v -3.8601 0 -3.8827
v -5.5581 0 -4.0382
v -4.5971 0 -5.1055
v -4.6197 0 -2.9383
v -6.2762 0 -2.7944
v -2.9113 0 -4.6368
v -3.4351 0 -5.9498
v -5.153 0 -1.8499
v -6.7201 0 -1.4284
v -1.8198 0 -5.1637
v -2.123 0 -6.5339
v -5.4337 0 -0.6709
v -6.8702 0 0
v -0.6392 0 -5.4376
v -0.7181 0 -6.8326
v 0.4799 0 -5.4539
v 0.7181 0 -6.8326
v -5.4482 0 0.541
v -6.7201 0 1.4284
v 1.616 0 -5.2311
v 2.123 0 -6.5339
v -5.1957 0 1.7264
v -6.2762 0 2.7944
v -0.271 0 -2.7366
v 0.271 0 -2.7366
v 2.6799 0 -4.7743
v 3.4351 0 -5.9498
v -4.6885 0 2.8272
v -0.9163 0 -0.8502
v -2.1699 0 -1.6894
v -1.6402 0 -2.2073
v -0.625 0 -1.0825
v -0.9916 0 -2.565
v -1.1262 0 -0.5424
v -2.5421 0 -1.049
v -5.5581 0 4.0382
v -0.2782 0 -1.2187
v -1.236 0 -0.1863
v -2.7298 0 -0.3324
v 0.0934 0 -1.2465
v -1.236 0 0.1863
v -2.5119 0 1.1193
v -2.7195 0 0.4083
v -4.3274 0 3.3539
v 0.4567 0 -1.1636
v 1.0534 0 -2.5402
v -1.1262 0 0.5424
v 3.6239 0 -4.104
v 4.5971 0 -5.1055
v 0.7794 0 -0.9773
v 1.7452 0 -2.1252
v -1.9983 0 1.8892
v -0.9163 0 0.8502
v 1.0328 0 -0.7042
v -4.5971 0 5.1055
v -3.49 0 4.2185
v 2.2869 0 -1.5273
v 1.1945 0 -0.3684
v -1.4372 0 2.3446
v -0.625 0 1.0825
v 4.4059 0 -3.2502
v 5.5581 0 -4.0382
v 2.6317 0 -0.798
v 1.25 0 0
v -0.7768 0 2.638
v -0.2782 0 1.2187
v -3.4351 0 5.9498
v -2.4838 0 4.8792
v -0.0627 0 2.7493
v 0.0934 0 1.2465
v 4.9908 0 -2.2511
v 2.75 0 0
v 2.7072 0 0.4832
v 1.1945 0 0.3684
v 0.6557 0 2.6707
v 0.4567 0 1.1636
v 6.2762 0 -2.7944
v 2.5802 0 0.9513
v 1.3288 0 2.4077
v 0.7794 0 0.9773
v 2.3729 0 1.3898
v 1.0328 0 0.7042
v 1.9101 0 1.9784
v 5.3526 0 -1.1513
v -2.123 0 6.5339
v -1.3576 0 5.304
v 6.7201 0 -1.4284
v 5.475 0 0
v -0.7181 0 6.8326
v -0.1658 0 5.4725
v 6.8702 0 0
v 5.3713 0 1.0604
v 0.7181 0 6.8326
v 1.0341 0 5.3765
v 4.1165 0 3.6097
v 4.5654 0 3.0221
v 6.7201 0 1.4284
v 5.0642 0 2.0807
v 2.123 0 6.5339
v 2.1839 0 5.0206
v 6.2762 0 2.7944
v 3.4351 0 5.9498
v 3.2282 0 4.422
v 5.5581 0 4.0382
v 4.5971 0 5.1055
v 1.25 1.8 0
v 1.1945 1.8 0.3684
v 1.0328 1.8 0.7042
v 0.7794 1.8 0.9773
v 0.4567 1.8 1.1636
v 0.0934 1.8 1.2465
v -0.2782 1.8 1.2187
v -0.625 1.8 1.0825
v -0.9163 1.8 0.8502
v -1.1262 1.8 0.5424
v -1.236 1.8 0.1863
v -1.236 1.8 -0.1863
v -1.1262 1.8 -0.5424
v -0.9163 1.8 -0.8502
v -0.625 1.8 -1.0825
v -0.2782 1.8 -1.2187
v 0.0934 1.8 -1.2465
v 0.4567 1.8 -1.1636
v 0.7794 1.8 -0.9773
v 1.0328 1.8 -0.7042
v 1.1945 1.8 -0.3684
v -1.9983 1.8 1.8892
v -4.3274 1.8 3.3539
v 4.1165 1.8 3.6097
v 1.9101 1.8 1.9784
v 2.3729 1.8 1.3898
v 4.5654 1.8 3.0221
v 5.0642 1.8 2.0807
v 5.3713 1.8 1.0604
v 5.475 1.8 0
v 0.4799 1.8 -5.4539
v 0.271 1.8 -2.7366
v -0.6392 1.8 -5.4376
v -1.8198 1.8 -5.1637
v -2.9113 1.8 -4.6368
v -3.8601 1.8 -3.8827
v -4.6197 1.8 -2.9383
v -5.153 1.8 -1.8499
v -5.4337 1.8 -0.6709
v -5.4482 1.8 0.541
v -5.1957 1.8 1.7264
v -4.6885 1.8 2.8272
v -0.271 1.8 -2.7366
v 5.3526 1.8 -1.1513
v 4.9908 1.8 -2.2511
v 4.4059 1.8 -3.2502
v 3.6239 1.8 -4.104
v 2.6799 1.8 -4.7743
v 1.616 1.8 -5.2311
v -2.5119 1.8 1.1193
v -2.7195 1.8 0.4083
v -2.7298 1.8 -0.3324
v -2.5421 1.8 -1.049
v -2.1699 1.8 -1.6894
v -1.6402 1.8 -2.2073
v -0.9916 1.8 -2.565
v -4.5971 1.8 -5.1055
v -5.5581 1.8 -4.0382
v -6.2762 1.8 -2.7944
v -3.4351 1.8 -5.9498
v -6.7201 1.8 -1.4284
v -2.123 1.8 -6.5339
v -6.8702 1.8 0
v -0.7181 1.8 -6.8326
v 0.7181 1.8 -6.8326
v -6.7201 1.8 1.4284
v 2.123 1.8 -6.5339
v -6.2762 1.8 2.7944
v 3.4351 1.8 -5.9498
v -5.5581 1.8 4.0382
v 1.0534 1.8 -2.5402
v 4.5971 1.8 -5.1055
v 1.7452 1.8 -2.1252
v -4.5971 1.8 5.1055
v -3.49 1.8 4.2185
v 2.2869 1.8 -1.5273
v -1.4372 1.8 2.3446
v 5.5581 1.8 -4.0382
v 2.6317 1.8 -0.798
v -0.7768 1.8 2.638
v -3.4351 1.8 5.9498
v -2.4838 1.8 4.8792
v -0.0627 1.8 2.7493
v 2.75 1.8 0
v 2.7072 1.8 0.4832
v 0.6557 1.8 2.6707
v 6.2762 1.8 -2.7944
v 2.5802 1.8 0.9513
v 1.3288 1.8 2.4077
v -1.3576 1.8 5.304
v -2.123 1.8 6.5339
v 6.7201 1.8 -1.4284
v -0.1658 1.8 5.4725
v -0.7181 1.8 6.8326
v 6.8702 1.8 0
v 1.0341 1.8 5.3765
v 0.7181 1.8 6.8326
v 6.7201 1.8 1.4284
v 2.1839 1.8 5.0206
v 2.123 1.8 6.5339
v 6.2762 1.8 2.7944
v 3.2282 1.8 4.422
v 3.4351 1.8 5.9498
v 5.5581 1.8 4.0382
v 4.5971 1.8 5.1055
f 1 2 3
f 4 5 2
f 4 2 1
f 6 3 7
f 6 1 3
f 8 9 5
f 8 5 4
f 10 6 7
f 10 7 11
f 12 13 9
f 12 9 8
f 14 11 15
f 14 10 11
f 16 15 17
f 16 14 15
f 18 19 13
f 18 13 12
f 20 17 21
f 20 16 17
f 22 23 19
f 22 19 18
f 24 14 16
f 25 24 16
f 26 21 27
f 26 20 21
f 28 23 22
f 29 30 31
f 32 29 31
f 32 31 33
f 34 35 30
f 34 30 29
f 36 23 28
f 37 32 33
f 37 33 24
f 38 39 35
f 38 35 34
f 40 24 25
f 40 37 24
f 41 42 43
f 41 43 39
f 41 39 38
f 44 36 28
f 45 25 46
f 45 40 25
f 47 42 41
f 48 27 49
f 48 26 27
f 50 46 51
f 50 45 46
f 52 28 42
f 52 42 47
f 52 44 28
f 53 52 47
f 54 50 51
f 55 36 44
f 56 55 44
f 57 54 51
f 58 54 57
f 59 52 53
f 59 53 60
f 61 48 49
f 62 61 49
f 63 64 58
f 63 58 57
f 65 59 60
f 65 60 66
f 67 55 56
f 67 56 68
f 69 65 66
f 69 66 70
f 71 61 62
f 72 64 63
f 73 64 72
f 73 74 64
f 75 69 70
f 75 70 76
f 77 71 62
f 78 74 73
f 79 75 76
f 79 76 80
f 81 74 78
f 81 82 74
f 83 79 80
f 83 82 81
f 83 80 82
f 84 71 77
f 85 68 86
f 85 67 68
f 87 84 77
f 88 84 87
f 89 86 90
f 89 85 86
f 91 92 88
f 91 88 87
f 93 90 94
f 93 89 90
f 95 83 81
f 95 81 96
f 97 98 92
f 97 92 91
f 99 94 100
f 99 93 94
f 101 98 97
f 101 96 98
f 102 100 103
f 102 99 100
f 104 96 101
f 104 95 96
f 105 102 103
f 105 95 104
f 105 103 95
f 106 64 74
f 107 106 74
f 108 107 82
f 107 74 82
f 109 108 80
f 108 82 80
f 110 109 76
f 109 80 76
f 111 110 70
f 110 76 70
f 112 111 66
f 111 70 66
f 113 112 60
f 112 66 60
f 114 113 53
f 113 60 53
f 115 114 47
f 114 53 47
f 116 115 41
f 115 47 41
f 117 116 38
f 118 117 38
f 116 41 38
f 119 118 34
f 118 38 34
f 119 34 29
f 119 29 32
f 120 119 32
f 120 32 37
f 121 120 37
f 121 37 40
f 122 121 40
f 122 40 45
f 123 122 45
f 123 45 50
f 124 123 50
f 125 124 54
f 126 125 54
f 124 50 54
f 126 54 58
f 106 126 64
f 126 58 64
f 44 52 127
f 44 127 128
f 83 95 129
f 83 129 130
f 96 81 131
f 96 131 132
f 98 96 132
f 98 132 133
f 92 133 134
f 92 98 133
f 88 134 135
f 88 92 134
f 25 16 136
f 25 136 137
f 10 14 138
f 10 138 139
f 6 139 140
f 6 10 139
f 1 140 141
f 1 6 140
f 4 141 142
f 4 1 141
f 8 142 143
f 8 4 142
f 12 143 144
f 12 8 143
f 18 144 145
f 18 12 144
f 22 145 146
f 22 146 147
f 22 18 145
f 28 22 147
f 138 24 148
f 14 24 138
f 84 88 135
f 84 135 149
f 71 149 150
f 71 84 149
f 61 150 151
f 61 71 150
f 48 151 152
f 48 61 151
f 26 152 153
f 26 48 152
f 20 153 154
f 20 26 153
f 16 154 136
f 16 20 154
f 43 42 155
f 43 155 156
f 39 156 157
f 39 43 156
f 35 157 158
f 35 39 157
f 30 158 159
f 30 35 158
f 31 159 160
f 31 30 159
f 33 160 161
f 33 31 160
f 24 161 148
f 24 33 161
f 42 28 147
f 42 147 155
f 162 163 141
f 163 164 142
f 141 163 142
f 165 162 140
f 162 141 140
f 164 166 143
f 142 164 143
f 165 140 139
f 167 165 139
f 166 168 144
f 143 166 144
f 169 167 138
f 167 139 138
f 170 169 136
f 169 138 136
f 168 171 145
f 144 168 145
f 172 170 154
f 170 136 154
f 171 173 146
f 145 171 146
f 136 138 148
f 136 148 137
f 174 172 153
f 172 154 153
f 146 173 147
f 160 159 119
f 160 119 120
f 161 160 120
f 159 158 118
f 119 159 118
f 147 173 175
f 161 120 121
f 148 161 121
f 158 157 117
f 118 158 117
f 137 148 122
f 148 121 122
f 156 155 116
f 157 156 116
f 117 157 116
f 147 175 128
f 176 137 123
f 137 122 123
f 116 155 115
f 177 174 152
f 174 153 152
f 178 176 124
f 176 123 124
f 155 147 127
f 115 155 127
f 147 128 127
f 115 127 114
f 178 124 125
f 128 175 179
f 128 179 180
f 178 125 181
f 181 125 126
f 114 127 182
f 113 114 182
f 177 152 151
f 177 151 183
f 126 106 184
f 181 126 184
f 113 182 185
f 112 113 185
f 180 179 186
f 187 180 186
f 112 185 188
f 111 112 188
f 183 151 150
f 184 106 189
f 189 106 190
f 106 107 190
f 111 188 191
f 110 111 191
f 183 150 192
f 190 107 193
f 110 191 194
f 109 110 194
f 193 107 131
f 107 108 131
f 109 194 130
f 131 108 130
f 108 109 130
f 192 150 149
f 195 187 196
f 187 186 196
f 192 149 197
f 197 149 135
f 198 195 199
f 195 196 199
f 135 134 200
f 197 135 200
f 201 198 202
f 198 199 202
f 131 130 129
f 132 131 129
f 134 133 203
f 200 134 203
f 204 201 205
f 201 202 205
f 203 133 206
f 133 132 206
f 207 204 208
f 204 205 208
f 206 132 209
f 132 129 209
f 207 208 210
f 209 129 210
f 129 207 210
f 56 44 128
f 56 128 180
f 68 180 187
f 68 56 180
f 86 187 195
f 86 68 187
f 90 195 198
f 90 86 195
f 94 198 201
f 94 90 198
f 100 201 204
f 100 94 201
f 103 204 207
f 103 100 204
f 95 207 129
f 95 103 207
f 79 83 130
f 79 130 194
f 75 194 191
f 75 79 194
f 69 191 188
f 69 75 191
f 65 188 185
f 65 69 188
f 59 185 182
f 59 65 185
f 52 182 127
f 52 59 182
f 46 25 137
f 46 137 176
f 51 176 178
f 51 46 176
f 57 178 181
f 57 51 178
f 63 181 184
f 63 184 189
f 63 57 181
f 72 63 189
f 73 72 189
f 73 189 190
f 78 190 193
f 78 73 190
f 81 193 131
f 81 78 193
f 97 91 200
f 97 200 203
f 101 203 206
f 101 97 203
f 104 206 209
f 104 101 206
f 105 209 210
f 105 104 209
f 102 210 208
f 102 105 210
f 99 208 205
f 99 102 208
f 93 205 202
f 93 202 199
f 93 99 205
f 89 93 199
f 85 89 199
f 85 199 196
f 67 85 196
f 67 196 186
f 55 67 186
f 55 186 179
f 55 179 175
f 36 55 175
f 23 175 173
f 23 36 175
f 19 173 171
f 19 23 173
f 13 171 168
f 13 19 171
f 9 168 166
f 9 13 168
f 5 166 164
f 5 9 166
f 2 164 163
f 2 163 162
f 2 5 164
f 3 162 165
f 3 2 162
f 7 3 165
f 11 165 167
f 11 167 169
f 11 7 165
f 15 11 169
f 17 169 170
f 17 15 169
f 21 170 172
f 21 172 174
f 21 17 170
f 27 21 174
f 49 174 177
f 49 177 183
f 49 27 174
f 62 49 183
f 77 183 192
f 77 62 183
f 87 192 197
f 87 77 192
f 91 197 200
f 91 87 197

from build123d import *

# Parameters (mm, degrees)
F0_R     = 6.870187
F0_R_2   = 1.25
F1_DEPTH = 1.8


with BuildPart() as f1:
    # F0 (on Front) → F1 (new body)
    with BuildSketch(Plane.XZ):
        Circle(F0_R)
        with BuildLine():
            ThreePointArc((4.565355, 3.022111), (5.242659, 1.578022), (5.475, 0))
            ThreePointArc((5.475, 0), (4.037518, -3.697847), (0.479905, -5.453927))
            ThreePointArc((0.479905, -5.453927), (-0.080045, -5.474415), (-0.639157, -5.437564))
            ThreePointArc((-0.639157, -5.437564), (-4.916584, -2.408906), (-4.688537, 2.827233))
            ThreePointArc((-4.688537, 2.827233), (-4.515673, 3.095855), (-4.327438, 3.353939))
            ThreePointArc((-4.327438, 3.353939), (-0.165763, 5.47249), (4.116508, 3.609708))
            ThreePointArc((4.116508, 3.609708), (4.350862, 3.323495), (4.565355, 3.022111))
        make_face(mode=Mode.SUBTRACT)
        with BuildLine():
            ThreePointArc((2.75, 0), (2.654061, 0.720041), (2.372939, 1.389842))
            ThreePointArc((2.372939, 1.389842), (2.161642, 1.699942), (1.910097, 1.978391))
            ThreePointArc((1.910097, 1.978391), (-0.062718, 2.749285), (-1.998327, 1.88923))
            ThreePointArc((-1.998327, 1.88923), (-2.287733, 1.526034), (-2.511897, 1.119318))
            ThreePointArc((-2.511897, 1.119318), (-2.377631, -1.3818), (-0.270954, -2.736619))
            ThreePointArc((-0.270954, -2.736619), (0, -2.75), (0.270954, -2.736619))
            ThreePointArc((0.270954, -2.736619), (2.03809, -1.846263), (2.75, 0))
        make_face()
        Circle(F0_R_2, mode=Mode.SUBTRACT)
        with BuildLine():
            Line((2.372939, 1.389842), (4.565355, 3.022111))
            ThreePointArc((4.565355, 3.022111), (4.350862, 3.323495), (4.116508, 3.609708))
            Line((4.116508, 3.609708), (1.910097, 1.978391))
            ThreePointArc((1.910097, 1.978391), (2.161642, 1.699942), (2.372939, 1.389842))
        make_face()
        with BuildLine():
            ThreePointArc((-0.639157, -5.437564), (-0.080045, -5.474415), (0.479905, -5.453927))
            Line((0.479905, -5.453927), (0.270954, -2.736619))
            ThreePointArc((0.270954, -2.736619), (0, -2.75), (-0.270954, -2.736619))
            Line((-0.270954, -2.736619), (-0.639157, -5.437564))
        make_face()
        with BuildLine():
            Line((-1.998327, 1.88923), (-4.327438, 3.353939))
            ThreePointArc((-4.327438, 3.353939), (-4.515673, 3.095855), (-4.688537, 2.827233))
            Line((-4.688537, 2.827233), (-2.511897, 1.119318))
            ThreePointArc((-2.511897, 1.119318), (-2.287733, 1.526034), (-1.998327, 1.88923))
        make_face()
    extrude(amount=-F1_DEPTH)


solid = f1.part
